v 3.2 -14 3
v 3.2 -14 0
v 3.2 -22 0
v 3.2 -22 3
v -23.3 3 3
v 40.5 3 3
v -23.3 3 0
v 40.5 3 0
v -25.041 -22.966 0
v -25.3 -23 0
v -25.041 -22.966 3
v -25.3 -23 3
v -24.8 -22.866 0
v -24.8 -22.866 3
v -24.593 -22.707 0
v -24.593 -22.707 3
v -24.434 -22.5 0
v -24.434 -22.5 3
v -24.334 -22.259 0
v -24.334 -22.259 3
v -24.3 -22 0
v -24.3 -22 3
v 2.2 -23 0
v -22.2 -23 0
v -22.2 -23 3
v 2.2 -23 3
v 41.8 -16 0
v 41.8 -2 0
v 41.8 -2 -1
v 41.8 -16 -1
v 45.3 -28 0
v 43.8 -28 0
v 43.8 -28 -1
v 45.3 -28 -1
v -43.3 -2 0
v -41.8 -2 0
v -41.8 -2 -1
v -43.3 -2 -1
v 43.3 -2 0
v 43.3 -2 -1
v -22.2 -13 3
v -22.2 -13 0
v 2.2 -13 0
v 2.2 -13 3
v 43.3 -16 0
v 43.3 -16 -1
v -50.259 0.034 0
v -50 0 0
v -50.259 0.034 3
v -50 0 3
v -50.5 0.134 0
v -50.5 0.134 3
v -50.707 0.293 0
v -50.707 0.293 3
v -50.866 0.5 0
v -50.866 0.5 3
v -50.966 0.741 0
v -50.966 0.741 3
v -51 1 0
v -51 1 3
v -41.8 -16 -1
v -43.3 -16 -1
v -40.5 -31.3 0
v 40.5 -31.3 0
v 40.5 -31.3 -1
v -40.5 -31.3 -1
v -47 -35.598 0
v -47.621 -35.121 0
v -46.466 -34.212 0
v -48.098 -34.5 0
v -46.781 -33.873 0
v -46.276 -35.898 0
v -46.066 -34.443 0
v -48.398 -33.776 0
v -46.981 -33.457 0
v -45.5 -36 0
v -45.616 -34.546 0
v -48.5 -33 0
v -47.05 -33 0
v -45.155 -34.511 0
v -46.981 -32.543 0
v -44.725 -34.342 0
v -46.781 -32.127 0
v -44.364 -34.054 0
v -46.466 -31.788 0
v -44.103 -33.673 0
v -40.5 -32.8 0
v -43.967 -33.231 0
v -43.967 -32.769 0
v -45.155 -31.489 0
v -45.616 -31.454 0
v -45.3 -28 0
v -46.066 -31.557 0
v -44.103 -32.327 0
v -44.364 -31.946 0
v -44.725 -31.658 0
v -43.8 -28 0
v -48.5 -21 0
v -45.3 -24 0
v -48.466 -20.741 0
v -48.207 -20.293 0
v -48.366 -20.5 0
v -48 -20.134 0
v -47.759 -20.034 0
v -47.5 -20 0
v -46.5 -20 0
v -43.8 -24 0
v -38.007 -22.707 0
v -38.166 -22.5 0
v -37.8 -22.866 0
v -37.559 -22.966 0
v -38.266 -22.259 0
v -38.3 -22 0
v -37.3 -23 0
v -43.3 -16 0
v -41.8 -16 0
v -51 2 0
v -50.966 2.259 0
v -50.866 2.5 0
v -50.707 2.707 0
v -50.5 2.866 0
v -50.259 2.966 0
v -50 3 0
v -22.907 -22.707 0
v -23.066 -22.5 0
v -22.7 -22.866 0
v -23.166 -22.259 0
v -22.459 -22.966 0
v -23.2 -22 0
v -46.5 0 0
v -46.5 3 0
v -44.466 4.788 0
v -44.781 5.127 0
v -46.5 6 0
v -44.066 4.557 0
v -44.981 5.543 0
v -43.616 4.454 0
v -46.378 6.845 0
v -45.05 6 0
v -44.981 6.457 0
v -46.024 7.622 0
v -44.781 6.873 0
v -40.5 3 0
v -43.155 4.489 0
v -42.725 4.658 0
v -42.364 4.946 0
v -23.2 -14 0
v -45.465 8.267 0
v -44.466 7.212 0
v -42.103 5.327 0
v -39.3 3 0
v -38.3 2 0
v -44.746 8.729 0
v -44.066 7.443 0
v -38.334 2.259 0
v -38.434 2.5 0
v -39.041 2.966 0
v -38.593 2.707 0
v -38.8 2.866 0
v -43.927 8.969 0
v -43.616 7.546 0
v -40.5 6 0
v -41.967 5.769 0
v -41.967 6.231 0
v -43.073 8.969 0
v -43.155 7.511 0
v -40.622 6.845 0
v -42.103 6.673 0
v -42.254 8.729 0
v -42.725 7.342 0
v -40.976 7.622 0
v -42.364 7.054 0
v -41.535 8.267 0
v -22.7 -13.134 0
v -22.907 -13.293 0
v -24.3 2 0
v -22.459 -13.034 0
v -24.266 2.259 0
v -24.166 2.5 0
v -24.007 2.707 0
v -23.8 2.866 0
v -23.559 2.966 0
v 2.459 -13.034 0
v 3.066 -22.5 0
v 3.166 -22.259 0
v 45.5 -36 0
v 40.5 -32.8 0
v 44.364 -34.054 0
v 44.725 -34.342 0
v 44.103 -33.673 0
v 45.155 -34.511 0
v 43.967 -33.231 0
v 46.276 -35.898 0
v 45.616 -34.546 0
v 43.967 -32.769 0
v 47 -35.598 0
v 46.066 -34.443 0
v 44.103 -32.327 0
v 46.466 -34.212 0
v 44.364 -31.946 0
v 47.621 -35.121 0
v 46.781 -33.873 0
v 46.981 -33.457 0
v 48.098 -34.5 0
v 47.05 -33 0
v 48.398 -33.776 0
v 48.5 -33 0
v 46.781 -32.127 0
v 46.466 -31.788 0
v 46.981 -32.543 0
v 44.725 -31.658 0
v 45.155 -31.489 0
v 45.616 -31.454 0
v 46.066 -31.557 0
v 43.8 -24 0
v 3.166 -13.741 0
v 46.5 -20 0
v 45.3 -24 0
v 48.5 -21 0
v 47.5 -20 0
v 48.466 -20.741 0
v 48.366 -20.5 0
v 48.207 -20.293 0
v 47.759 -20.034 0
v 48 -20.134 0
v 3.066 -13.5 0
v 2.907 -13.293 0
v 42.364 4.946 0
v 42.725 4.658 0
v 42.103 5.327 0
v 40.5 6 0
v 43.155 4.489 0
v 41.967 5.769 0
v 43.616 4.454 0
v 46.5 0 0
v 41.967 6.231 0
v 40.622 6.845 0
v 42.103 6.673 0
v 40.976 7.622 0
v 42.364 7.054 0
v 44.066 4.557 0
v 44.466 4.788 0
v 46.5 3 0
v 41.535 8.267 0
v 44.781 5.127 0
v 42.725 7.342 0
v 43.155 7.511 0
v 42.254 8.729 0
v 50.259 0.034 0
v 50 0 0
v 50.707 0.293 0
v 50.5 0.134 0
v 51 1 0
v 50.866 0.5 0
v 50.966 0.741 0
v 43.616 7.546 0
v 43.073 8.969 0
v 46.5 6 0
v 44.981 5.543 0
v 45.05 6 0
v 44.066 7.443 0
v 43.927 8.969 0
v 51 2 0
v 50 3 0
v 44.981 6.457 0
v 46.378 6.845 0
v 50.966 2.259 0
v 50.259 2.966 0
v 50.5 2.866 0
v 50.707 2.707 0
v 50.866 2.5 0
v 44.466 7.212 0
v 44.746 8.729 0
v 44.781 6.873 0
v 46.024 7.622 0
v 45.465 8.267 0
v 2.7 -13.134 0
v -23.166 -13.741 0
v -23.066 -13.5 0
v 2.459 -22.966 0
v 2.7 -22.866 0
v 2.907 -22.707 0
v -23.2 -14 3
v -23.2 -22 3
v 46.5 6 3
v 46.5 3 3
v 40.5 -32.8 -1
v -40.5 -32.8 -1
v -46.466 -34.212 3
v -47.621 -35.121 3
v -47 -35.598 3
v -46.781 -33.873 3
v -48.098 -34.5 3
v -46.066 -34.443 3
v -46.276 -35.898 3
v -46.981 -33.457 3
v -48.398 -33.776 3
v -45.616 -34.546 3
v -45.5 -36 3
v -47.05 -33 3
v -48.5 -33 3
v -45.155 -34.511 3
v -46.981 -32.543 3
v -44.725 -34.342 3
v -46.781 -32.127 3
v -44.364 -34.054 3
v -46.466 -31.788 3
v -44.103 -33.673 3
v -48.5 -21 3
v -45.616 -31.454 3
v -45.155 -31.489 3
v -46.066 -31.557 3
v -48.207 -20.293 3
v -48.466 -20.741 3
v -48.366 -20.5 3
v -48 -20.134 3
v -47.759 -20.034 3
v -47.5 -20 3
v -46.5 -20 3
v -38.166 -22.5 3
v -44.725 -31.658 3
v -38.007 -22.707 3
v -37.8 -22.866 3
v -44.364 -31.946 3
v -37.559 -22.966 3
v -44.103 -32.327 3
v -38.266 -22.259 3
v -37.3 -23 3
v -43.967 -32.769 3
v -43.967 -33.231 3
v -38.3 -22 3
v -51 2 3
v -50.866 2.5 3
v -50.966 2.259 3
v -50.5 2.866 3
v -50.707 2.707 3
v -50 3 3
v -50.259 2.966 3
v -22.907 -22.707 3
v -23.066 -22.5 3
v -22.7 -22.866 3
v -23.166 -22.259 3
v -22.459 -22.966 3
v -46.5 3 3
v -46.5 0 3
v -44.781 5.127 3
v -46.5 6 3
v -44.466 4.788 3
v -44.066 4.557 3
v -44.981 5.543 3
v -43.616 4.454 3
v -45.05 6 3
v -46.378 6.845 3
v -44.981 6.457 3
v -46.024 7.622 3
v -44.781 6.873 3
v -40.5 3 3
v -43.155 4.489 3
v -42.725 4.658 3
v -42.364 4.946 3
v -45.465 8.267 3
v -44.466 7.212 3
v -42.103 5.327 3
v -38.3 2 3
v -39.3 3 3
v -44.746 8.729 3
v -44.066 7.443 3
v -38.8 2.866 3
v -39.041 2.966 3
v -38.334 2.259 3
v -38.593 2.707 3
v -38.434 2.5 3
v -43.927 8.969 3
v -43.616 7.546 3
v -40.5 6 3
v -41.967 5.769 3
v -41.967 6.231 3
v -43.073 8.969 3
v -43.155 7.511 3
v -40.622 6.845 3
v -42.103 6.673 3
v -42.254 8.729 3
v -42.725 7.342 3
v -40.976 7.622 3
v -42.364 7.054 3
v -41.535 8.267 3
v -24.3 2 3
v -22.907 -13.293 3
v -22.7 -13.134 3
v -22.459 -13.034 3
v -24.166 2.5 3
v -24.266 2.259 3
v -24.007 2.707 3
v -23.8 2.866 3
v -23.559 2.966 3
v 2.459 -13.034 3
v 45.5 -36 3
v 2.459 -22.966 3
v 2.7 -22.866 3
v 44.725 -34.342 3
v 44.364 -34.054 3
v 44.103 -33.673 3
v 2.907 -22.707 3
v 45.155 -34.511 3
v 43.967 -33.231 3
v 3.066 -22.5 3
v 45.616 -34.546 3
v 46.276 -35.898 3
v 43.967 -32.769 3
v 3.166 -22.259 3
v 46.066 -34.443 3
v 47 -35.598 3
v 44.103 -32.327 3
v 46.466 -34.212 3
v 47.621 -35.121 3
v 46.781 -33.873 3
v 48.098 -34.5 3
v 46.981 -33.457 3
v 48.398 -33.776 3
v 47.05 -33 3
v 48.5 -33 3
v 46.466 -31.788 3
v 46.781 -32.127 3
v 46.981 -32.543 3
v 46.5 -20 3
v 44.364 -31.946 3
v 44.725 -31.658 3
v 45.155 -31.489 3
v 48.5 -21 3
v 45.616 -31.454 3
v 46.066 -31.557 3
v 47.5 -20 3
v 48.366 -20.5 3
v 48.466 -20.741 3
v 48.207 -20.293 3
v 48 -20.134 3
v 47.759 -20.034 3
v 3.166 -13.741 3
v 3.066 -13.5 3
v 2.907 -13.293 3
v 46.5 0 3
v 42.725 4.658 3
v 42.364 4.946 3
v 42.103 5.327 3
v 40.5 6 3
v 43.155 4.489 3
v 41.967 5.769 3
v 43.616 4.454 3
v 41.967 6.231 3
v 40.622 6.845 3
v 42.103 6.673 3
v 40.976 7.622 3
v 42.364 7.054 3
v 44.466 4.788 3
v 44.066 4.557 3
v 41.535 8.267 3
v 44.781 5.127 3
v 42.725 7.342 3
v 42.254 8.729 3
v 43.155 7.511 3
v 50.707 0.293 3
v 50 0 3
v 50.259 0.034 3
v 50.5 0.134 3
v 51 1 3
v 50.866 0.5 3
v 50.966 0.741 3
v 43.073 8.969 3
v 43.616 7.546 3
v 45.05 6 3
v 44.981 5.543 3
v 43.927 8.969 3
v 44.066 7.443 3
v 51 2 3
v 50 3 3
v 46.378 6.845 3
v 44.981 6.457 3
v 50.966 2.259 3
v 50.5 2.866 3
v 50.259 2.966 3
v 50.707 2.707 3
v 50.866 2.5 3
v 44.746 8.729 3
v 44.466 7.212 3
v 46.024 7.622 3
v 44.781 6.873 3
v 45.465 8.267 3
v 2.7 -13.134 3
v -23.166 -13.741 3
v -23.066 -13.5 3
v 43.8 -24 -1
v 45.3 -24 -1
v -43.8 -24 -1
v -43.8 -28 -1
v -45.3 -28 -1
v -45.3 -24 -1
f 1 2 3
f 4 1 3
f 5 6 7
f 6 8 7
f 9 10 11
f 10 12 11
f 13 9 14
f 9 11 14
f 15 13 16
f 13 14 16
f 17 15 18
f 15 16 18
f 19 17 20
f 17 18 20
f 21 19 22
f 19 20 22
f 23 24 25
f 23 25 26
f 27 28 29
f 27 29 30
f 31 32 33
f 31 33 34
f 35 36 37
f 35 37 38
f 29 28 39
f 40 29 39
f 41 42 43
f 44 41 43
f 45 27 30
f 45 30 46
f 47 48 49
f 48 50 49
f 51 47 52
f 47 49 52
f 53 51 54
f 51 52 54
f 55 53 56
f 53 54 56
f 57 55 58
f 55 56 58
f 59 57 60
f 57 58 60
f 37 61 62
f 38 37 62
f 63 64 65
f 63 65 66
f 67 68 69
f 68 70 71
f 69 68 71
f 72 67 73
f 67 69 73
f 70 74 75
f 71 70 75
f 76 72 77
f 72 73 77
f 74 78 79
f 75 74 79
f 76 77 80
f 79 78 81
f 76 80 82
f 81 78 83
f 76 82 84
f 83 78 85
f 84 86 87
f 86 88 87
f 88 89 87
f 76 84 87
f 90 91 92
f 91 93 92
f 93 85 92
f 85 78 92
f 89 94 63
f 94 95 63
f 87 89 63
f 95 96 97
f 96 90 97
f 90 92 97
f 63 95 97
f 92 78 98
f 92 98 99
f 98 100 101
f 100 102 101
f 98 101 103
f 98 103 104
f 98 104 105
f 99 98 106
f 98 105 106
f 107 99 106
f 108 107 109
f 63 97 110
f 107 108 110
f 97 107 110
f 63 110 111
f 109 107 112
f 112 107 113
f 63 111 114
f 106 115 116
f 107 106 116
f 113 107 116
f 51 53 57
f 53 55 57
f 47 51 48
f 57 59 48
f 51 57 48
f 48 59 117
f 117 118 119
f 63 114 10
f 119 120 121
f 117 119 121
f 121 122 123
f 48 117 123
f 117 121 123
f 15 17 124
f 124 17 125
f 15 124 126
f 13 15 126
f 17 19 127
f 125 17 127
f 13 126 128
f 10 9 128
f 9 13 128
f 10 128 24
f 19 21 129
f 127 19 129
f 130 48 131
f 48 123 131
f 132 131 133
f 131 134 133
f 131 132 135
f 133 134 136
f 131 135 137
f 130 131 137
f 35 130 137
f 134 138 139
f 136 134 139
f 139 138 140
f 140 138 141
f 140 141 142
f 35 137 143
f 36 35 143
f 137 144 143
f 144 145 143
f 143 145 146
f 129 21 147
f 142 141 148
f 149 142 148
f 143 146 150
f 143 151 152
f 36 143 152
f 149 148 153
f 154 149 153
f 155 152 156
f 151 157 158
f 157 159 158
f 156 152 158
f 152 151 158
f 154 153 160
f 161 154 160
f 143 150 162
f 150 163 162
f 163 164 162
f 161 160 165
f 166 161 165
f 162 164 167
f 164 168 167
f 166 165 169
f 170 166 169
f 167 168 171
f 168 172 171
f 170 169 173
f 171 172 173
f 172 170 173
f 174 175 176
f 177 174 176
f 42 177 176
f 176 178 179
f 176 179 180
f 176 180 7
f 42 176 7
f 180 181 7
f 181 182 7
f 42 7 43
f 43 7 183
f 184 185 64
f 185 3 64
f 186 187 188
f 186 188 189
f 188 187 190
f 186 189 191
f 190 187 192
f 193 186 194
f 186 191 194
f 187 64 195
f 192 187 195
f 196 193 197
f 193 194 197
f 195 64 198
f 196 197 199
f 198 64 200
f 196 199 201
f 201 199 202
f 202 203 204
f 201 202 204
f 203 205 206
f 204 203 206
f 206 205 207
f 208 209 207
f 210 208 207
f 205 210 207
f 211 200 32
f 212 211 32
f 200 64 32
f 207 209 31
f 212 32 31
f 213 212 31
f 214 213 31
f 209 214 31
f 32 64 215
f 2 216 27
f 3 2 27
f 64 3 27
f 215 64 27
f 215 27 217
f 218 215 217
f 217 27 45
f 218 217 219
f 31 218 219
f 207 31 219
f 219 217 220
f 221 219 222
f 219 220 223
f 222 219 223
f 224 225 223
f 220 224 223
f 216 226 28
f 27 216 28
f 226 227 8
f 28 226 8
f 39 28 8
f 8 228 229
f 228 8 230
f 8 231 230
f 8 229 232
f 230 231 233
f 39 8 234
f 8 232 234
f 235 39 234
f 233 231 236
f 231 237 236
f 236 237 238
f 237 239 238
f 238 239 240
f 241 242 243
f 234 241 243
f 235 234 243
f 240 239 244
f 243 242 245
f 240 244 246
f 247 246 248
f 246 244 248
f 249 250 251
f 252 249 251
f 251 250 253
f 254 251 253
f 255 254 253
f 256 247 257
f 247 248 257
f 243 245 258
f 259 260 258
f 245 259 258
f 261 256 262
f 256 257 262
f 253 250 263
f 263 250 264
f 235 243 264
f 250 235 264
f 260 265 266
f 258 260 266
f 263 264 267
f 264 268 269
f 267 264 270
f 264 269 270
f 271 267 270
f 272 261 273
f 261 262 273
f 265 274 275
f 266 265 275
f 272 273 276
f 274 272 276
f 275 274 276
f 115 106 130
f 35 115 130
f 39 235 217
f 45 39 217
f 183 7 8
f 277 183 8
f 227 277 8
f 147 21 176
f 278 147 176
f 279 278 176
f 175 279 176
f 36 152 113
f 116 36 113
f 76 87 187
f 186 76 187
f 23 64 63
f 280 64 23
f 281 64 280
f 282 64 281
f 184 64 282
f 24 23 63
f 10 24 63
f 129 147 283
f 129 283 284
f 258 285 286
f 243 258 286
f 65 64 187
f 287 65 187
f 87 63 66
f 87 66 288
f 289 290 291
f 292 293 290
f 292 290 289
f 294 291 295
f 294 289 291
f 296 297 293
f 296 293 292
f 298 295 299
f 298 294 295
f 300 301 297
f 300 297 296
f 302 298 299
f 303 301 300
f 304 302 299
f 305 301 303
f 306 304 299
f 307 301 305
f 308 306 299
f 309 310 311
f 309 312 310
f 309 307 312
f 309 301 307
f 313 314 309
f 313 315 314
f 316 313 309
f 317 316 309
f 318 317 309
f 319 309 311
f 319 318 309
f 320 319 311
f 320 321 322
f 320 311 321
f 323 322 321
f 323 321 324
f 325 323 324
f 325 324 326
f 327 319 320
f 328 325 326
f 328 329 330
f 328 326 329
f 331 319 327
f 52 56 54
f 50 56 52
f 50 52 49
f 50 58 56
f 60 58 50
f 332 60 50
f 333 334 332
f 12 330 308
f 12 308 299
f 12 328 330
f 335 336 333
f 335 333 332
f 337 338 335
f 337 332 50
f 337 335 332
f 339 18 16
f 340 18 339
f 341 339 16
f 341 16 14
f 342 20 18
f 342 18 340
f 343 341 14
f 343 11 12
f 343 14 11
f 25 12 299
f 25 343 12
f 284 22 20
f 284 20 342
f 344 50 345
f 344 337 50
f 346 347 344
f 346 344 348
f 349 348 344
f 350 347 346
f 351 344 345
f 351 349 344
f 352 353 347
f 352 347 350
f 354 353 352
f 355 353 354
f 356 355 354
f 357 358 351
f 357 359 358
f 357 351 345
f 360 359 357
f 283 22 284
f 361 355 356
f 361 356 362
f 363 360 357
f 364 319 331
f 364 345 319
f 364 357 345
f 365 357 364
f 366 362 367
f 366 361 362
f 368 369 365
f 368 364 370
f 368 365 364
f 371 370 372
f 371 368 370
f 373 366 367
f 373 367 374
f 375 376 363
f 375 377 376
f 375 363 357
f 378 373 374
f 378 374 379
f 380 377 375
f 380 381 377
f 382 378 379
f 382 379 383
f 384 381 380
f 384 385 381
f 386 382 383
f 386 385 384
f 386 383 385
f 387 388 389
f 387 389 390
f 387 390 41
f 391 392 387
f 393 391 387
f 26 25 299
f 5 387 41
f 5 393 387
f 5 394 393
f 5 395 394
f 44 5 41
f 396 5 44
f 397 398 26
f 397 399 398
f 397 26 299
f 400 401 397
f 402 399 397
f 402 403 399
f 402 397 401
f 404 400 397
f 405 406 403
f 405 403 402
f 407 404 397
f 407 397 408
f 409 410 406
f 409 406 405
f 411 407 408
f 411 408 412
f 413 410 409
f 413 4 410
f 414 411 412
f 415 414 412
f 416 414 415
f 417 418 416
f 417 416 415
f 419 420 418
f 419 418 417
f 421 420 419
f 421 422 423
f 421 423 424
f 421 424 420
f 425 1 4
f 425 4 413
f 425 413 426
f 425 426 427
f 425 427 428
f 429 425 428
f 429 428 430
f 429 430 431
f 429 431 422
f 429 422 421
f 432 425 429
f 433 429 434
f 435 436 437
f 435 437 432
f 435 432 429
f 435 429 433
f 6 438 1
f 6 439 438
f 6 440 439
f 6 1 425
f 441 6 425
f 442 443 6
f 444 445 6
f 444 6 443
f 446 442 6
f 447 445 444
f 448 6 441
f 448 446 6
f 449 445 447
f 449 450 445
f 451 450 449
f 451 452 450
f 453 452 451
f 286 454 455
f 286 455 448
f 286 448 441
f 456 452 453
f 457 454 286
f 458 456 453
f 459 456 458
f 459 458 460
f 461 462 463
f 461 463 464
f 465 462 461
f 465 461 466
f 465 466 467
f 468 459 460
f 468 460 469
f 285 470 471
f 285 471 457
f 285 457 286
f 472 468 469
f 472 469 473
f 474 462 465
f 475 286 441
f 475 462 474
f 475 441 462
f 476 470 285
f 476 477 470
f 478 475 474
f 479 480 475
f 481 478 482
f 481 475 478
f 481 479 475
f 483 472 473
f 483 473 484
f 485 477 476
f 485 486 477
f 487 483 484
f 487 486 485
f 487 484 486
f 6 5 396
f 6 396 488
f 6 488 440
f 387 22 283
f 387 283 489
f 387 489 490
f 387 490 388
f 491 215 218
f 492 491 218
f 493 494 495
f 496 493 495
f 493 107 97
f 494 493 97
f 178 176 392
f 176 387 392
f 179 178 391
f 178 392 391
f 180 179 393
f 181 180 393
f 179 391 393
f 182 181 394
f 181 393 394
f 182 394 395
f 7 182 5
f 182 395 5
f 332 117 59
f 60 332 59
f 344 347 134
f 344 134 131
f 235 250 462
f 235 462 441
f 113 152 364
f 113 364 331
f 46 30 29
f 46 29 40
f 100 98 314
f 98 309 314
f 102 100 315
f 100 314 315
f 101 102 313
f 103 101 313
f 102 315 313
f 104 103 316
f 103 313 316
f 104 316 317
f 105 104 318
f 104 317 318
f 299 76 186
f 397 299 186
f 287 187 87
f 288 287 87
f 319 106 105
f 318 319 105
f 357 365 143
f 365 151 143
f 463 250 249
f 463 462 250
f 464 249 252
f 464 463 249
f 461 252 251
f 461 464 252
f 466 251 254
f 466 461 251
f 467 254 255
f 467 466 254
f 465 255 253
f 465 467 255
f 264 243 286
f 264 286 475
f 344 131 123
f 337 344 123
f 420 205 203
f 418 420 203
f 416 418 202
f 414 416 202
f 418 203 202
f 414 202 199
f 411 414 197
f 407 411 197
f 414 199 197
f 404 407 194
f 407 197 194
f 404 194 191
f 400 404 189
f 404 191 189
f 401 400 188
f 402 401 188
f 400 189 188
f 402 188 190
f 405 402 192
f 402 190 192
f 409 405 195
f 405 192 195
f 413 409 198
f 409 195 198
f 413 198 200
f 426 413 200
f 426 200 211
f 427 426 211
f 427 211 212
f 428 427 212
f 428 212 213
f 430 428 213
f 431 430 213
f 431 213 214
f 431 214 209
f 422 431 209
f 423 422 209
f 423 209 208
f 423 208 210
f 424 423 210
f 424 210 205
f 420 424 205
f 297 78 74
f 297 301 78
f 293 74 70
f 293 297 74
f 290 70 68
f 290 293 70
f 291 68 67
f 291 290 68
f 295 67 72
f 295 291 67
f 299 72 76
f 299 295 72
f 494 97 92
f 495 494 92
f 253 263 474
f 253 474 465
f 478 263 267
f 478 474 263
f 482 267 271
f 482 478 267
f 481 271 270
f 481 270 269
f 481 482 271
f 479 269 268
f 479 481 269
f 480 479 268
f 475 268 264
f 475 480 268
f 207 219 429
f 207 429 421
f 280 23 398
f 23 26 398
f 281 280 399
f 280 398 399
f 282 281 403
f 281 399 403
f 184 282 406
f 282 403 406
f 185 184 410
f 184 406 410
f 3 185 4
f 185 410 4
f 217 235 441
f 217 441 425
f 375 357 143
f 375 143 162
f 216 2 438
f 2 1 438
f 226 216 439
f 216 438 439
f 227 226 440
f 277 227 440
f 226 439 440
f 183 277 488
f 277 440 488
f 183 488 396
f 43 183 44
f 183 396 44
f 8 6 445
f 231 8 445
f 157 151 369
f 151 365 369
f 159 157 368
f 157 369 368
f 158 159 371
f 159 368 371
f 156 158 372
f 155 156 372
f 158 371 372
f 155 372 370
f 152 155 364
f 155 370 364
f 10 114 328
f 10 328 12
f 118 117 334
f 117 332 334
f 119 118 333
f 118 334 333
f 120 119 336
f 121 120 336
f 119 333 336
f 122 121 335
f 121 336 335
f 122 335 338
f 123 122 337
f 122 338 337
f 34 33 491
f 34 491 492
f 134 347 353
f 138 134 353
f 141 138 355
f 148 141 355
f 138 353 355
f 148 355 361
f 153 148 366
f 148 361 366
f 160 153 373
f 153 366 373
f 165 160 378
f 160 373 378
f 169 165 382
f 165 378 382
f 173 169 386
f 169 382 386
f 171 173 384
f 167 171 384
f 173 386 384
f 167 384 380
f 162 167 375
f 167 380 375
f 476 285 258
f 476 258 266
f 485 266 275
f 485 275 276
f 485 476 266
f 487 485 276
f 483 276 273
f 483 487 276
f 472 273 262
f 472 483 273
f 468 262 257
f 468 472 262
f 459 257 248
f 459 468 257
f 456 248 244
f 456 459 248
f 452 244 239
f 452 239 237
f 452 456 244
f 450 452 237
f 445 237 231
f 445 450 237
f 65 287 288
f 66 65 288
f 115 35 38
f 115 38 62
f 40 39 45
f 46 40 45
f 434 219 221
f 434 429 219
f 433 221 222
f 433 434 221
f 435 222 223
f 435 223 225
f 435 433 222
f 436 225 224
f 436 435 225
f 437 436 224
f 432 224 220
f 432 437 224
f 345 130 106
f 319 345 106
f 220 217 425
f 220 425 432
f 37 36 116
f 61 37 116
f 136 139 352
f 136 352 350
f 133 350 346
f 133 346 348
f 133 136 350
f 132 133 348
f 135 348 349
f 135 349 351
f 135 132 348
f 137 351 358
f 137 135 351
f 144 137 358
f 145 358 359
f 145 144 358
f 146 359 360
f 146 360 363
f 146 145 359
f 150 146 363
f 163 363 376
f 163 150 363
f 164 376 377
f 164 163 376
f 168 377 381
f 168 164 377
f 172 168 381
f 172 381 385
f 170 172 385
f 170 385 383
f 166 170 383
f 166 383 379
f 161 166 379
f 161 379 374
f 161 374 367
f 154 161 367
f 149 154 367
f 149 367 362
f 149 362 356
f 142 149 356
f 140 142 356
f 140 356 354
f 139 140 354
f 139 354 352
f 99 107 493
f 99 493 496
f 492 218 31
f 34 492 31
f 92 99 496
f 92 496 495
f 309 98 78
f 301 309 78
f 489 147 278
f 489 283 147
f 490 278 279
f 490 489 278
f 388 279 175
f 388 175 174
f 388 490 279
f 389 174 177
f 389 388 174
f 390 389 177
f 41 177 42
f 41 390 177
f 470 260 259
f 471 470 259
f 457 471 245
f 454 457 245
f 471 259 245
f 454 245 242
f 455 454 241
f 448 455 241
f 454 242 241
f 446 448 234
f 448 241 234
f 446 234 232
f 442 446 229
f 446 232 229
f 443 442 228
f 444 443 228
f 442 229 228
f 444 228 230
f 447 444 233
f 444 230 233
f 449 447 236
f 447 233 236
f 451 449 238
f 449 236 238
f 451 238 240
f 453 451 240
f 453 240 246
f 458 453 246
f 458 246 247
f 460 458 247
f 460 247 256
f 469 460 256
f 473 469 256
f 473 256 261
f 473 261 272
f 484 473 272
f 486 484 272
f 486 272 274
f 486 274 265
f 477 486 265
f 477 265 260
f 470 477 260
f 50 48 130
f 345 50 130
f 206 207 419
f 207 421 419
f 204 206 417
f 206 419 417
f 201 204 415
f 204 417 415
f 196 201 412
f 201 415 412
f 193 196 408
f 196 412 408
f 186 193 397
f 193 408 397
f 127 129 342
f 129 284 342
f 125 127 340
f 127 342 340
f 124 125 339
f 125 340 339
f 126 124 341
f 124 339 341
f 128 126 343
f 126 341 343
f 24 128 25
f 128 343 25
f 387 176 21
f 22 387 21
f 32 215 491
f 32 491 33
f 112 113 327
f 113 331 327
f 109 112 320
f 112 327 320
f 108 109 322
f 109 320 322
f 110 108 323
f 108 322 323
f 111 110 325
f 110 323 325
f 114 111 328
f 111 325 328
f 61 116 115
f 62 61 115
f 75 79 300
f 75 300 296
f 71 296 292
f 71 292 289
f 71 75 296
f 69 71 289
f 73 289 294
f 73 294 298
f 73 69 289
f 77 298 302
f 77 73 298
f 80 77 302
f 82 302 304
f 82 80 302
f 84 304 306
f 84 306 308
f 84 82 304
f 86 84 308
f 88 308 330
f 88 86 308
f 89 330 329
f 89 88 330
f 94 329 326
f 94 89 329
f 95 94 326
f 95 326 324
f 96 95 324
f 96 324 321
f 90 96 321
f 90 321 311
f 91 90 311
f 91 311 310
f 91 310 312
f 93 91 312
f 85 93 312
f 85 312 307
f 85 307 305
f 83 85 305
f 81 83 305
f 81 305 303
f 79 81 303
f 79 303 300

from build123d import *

# Parameters (mm, degrees)
PAD_DEPTH       = 3
PAD001_DEPTH    = 3
FILLET_R        = 3
FILLET001_R     = 1
FILLET002_R     = 1
SKETCH003_W     = 1.5
SKETCH003_H     = 14
SKETCH003_H_2   = 4
SKETCH003_W_2   = 40.5
SKETCH003_H_3   = 1.5
PAD002_DEPTH    = 1
SKETCH004_R     = 1.55
POCKET_DEPTH    = 3.001
SKETCH005_W     = 14
SKETCH005_H     = 26
SKETCH005_W_2   = 26.4
SKETCH005_H_2   = 10
POCKET001_DEPTH = 3.001
FILLET003_R     = 1


with BuildPart() as part:
    # Sketch → Pad (new body)
    with BuildSketch(Plane.XY):
        Polygon((0, 3), (51, 3), (51, 0), (46.5, 0), (46.5, -20), (48.5, -20), (48.5, -36), (0, -36), align=None)
    extrude(amount=PAD_DEPTH)

    # Sketch001 (on Face10 of Pad) → Pad001 (join)
    with BuildSketch(Plane.XY.offset(3)):
        with BuildLine():
            Line((46.5, 6), (46.5, 3))
            Line((46.5, 3), (40.5, 3))
            Line((40.5, 3), (40.5, 6))
            ThreePointArc((46.5, 6), (43.5, 9), (40.5, 6))
        make_face()
    extrude(amount=-PAD001_DEPTH)

    # Fillet
    fillet_edges = [part.edges().sort_by_distance(p)[0] for p in [
        (48.5, -36, 1.5),
    ]]
    fillet(fillet_edges, radius=FILLET_R)

    # Fillet001
    fillet001_edges = [part.edges().sort_by_distance(p)[0] for p in [
        (48.5, -20, 1.5),
    ]]
    fillet(fillet001_edges, radius=FILLET001_R)

    # Fillet002
    fillet002_edges = [part.edges().sort_by_distance(p)[0] for p in [
        (51, 3, 1.5),
        (51, 0, 1.5),
    ]]
    fillet(fillet002_edges, radius=FILLET002_R)

    # Sketch003 → Pad002 (join)
    with BuildSketch(Plane(origin=(0, 0, 0), x_dir=(1, 0, 0), z_dir=(0, 0, -1))):
        with Locations((42.55, 9)):
            Rectangle(SKETCH003_W, SKETCH003_H)
        with Locations((44.55, 26)):
            Rectangle(SKETCH003_W, SKETCH003_H_2)
        with Locations((20.25, 32.05)):
            Rectangle(SKETCH003_W_2, SKETCH003_H_3)
    extrude(amount=PAD002_DEPTH)

    # Sketch004 (on Face1 of Pad002) → Pocket (cut, through all)
    with BuildSketch(Plane(origin=(0, 0, 0), x_dir=(1, 0, 0), z_dir=(0, 0, -1))):
        with Locations((45.5, 33)):
            Circle(SKETCH004_R)
        with Locations((43.5, -6)):
            Circle(SKETCH004_R)
    extrude(amount=-POCKET_DEPTH, mode=Mode.SUBTRACT)

    # Mirrored: part across YZ


with BuildPart() as part_1:
    add(part.part)
    add(part.part.mirror(Plane.YZ))

    # Sketch005 (on Face14 of Mirrored) → Pocket001 (cut, through all)
    with BuildSketch(Plane(origin=(0, 0, 0), x_dir=(1, 0, 0), z_dir=(0, 0, -1))):
        with Locations((-31.3, 10)):
            Rectangle(SKETCH005_W, SKETCH005_H)
        with Locations((-10, 18)):
            Rectangle(SKETCH005_W_2, SKETCH005_H_2)
    extrude(amount=-POCKET001_DEPTH, mode=Mode.SUBTRACT)

    # Fillet003
    fillet003_edges = [part_1.edges().sort_by_distance(p)[0] for p in [
        (-24.3, 3, 1.5),
        (-38.3, 3, 1.5),
        (-38.3, -23, 1.5),
        (-23.2, -23, 1.5),
        (-23.2, -13, 1.5),
        (3.2, -13, 1.5),
        (3.2, -23, 1.5),
        (-24.3, -23, 1.5),
    ]]
    fillet(fillet003_edges, radius=FILLET003_R)


solid = part_1.part
